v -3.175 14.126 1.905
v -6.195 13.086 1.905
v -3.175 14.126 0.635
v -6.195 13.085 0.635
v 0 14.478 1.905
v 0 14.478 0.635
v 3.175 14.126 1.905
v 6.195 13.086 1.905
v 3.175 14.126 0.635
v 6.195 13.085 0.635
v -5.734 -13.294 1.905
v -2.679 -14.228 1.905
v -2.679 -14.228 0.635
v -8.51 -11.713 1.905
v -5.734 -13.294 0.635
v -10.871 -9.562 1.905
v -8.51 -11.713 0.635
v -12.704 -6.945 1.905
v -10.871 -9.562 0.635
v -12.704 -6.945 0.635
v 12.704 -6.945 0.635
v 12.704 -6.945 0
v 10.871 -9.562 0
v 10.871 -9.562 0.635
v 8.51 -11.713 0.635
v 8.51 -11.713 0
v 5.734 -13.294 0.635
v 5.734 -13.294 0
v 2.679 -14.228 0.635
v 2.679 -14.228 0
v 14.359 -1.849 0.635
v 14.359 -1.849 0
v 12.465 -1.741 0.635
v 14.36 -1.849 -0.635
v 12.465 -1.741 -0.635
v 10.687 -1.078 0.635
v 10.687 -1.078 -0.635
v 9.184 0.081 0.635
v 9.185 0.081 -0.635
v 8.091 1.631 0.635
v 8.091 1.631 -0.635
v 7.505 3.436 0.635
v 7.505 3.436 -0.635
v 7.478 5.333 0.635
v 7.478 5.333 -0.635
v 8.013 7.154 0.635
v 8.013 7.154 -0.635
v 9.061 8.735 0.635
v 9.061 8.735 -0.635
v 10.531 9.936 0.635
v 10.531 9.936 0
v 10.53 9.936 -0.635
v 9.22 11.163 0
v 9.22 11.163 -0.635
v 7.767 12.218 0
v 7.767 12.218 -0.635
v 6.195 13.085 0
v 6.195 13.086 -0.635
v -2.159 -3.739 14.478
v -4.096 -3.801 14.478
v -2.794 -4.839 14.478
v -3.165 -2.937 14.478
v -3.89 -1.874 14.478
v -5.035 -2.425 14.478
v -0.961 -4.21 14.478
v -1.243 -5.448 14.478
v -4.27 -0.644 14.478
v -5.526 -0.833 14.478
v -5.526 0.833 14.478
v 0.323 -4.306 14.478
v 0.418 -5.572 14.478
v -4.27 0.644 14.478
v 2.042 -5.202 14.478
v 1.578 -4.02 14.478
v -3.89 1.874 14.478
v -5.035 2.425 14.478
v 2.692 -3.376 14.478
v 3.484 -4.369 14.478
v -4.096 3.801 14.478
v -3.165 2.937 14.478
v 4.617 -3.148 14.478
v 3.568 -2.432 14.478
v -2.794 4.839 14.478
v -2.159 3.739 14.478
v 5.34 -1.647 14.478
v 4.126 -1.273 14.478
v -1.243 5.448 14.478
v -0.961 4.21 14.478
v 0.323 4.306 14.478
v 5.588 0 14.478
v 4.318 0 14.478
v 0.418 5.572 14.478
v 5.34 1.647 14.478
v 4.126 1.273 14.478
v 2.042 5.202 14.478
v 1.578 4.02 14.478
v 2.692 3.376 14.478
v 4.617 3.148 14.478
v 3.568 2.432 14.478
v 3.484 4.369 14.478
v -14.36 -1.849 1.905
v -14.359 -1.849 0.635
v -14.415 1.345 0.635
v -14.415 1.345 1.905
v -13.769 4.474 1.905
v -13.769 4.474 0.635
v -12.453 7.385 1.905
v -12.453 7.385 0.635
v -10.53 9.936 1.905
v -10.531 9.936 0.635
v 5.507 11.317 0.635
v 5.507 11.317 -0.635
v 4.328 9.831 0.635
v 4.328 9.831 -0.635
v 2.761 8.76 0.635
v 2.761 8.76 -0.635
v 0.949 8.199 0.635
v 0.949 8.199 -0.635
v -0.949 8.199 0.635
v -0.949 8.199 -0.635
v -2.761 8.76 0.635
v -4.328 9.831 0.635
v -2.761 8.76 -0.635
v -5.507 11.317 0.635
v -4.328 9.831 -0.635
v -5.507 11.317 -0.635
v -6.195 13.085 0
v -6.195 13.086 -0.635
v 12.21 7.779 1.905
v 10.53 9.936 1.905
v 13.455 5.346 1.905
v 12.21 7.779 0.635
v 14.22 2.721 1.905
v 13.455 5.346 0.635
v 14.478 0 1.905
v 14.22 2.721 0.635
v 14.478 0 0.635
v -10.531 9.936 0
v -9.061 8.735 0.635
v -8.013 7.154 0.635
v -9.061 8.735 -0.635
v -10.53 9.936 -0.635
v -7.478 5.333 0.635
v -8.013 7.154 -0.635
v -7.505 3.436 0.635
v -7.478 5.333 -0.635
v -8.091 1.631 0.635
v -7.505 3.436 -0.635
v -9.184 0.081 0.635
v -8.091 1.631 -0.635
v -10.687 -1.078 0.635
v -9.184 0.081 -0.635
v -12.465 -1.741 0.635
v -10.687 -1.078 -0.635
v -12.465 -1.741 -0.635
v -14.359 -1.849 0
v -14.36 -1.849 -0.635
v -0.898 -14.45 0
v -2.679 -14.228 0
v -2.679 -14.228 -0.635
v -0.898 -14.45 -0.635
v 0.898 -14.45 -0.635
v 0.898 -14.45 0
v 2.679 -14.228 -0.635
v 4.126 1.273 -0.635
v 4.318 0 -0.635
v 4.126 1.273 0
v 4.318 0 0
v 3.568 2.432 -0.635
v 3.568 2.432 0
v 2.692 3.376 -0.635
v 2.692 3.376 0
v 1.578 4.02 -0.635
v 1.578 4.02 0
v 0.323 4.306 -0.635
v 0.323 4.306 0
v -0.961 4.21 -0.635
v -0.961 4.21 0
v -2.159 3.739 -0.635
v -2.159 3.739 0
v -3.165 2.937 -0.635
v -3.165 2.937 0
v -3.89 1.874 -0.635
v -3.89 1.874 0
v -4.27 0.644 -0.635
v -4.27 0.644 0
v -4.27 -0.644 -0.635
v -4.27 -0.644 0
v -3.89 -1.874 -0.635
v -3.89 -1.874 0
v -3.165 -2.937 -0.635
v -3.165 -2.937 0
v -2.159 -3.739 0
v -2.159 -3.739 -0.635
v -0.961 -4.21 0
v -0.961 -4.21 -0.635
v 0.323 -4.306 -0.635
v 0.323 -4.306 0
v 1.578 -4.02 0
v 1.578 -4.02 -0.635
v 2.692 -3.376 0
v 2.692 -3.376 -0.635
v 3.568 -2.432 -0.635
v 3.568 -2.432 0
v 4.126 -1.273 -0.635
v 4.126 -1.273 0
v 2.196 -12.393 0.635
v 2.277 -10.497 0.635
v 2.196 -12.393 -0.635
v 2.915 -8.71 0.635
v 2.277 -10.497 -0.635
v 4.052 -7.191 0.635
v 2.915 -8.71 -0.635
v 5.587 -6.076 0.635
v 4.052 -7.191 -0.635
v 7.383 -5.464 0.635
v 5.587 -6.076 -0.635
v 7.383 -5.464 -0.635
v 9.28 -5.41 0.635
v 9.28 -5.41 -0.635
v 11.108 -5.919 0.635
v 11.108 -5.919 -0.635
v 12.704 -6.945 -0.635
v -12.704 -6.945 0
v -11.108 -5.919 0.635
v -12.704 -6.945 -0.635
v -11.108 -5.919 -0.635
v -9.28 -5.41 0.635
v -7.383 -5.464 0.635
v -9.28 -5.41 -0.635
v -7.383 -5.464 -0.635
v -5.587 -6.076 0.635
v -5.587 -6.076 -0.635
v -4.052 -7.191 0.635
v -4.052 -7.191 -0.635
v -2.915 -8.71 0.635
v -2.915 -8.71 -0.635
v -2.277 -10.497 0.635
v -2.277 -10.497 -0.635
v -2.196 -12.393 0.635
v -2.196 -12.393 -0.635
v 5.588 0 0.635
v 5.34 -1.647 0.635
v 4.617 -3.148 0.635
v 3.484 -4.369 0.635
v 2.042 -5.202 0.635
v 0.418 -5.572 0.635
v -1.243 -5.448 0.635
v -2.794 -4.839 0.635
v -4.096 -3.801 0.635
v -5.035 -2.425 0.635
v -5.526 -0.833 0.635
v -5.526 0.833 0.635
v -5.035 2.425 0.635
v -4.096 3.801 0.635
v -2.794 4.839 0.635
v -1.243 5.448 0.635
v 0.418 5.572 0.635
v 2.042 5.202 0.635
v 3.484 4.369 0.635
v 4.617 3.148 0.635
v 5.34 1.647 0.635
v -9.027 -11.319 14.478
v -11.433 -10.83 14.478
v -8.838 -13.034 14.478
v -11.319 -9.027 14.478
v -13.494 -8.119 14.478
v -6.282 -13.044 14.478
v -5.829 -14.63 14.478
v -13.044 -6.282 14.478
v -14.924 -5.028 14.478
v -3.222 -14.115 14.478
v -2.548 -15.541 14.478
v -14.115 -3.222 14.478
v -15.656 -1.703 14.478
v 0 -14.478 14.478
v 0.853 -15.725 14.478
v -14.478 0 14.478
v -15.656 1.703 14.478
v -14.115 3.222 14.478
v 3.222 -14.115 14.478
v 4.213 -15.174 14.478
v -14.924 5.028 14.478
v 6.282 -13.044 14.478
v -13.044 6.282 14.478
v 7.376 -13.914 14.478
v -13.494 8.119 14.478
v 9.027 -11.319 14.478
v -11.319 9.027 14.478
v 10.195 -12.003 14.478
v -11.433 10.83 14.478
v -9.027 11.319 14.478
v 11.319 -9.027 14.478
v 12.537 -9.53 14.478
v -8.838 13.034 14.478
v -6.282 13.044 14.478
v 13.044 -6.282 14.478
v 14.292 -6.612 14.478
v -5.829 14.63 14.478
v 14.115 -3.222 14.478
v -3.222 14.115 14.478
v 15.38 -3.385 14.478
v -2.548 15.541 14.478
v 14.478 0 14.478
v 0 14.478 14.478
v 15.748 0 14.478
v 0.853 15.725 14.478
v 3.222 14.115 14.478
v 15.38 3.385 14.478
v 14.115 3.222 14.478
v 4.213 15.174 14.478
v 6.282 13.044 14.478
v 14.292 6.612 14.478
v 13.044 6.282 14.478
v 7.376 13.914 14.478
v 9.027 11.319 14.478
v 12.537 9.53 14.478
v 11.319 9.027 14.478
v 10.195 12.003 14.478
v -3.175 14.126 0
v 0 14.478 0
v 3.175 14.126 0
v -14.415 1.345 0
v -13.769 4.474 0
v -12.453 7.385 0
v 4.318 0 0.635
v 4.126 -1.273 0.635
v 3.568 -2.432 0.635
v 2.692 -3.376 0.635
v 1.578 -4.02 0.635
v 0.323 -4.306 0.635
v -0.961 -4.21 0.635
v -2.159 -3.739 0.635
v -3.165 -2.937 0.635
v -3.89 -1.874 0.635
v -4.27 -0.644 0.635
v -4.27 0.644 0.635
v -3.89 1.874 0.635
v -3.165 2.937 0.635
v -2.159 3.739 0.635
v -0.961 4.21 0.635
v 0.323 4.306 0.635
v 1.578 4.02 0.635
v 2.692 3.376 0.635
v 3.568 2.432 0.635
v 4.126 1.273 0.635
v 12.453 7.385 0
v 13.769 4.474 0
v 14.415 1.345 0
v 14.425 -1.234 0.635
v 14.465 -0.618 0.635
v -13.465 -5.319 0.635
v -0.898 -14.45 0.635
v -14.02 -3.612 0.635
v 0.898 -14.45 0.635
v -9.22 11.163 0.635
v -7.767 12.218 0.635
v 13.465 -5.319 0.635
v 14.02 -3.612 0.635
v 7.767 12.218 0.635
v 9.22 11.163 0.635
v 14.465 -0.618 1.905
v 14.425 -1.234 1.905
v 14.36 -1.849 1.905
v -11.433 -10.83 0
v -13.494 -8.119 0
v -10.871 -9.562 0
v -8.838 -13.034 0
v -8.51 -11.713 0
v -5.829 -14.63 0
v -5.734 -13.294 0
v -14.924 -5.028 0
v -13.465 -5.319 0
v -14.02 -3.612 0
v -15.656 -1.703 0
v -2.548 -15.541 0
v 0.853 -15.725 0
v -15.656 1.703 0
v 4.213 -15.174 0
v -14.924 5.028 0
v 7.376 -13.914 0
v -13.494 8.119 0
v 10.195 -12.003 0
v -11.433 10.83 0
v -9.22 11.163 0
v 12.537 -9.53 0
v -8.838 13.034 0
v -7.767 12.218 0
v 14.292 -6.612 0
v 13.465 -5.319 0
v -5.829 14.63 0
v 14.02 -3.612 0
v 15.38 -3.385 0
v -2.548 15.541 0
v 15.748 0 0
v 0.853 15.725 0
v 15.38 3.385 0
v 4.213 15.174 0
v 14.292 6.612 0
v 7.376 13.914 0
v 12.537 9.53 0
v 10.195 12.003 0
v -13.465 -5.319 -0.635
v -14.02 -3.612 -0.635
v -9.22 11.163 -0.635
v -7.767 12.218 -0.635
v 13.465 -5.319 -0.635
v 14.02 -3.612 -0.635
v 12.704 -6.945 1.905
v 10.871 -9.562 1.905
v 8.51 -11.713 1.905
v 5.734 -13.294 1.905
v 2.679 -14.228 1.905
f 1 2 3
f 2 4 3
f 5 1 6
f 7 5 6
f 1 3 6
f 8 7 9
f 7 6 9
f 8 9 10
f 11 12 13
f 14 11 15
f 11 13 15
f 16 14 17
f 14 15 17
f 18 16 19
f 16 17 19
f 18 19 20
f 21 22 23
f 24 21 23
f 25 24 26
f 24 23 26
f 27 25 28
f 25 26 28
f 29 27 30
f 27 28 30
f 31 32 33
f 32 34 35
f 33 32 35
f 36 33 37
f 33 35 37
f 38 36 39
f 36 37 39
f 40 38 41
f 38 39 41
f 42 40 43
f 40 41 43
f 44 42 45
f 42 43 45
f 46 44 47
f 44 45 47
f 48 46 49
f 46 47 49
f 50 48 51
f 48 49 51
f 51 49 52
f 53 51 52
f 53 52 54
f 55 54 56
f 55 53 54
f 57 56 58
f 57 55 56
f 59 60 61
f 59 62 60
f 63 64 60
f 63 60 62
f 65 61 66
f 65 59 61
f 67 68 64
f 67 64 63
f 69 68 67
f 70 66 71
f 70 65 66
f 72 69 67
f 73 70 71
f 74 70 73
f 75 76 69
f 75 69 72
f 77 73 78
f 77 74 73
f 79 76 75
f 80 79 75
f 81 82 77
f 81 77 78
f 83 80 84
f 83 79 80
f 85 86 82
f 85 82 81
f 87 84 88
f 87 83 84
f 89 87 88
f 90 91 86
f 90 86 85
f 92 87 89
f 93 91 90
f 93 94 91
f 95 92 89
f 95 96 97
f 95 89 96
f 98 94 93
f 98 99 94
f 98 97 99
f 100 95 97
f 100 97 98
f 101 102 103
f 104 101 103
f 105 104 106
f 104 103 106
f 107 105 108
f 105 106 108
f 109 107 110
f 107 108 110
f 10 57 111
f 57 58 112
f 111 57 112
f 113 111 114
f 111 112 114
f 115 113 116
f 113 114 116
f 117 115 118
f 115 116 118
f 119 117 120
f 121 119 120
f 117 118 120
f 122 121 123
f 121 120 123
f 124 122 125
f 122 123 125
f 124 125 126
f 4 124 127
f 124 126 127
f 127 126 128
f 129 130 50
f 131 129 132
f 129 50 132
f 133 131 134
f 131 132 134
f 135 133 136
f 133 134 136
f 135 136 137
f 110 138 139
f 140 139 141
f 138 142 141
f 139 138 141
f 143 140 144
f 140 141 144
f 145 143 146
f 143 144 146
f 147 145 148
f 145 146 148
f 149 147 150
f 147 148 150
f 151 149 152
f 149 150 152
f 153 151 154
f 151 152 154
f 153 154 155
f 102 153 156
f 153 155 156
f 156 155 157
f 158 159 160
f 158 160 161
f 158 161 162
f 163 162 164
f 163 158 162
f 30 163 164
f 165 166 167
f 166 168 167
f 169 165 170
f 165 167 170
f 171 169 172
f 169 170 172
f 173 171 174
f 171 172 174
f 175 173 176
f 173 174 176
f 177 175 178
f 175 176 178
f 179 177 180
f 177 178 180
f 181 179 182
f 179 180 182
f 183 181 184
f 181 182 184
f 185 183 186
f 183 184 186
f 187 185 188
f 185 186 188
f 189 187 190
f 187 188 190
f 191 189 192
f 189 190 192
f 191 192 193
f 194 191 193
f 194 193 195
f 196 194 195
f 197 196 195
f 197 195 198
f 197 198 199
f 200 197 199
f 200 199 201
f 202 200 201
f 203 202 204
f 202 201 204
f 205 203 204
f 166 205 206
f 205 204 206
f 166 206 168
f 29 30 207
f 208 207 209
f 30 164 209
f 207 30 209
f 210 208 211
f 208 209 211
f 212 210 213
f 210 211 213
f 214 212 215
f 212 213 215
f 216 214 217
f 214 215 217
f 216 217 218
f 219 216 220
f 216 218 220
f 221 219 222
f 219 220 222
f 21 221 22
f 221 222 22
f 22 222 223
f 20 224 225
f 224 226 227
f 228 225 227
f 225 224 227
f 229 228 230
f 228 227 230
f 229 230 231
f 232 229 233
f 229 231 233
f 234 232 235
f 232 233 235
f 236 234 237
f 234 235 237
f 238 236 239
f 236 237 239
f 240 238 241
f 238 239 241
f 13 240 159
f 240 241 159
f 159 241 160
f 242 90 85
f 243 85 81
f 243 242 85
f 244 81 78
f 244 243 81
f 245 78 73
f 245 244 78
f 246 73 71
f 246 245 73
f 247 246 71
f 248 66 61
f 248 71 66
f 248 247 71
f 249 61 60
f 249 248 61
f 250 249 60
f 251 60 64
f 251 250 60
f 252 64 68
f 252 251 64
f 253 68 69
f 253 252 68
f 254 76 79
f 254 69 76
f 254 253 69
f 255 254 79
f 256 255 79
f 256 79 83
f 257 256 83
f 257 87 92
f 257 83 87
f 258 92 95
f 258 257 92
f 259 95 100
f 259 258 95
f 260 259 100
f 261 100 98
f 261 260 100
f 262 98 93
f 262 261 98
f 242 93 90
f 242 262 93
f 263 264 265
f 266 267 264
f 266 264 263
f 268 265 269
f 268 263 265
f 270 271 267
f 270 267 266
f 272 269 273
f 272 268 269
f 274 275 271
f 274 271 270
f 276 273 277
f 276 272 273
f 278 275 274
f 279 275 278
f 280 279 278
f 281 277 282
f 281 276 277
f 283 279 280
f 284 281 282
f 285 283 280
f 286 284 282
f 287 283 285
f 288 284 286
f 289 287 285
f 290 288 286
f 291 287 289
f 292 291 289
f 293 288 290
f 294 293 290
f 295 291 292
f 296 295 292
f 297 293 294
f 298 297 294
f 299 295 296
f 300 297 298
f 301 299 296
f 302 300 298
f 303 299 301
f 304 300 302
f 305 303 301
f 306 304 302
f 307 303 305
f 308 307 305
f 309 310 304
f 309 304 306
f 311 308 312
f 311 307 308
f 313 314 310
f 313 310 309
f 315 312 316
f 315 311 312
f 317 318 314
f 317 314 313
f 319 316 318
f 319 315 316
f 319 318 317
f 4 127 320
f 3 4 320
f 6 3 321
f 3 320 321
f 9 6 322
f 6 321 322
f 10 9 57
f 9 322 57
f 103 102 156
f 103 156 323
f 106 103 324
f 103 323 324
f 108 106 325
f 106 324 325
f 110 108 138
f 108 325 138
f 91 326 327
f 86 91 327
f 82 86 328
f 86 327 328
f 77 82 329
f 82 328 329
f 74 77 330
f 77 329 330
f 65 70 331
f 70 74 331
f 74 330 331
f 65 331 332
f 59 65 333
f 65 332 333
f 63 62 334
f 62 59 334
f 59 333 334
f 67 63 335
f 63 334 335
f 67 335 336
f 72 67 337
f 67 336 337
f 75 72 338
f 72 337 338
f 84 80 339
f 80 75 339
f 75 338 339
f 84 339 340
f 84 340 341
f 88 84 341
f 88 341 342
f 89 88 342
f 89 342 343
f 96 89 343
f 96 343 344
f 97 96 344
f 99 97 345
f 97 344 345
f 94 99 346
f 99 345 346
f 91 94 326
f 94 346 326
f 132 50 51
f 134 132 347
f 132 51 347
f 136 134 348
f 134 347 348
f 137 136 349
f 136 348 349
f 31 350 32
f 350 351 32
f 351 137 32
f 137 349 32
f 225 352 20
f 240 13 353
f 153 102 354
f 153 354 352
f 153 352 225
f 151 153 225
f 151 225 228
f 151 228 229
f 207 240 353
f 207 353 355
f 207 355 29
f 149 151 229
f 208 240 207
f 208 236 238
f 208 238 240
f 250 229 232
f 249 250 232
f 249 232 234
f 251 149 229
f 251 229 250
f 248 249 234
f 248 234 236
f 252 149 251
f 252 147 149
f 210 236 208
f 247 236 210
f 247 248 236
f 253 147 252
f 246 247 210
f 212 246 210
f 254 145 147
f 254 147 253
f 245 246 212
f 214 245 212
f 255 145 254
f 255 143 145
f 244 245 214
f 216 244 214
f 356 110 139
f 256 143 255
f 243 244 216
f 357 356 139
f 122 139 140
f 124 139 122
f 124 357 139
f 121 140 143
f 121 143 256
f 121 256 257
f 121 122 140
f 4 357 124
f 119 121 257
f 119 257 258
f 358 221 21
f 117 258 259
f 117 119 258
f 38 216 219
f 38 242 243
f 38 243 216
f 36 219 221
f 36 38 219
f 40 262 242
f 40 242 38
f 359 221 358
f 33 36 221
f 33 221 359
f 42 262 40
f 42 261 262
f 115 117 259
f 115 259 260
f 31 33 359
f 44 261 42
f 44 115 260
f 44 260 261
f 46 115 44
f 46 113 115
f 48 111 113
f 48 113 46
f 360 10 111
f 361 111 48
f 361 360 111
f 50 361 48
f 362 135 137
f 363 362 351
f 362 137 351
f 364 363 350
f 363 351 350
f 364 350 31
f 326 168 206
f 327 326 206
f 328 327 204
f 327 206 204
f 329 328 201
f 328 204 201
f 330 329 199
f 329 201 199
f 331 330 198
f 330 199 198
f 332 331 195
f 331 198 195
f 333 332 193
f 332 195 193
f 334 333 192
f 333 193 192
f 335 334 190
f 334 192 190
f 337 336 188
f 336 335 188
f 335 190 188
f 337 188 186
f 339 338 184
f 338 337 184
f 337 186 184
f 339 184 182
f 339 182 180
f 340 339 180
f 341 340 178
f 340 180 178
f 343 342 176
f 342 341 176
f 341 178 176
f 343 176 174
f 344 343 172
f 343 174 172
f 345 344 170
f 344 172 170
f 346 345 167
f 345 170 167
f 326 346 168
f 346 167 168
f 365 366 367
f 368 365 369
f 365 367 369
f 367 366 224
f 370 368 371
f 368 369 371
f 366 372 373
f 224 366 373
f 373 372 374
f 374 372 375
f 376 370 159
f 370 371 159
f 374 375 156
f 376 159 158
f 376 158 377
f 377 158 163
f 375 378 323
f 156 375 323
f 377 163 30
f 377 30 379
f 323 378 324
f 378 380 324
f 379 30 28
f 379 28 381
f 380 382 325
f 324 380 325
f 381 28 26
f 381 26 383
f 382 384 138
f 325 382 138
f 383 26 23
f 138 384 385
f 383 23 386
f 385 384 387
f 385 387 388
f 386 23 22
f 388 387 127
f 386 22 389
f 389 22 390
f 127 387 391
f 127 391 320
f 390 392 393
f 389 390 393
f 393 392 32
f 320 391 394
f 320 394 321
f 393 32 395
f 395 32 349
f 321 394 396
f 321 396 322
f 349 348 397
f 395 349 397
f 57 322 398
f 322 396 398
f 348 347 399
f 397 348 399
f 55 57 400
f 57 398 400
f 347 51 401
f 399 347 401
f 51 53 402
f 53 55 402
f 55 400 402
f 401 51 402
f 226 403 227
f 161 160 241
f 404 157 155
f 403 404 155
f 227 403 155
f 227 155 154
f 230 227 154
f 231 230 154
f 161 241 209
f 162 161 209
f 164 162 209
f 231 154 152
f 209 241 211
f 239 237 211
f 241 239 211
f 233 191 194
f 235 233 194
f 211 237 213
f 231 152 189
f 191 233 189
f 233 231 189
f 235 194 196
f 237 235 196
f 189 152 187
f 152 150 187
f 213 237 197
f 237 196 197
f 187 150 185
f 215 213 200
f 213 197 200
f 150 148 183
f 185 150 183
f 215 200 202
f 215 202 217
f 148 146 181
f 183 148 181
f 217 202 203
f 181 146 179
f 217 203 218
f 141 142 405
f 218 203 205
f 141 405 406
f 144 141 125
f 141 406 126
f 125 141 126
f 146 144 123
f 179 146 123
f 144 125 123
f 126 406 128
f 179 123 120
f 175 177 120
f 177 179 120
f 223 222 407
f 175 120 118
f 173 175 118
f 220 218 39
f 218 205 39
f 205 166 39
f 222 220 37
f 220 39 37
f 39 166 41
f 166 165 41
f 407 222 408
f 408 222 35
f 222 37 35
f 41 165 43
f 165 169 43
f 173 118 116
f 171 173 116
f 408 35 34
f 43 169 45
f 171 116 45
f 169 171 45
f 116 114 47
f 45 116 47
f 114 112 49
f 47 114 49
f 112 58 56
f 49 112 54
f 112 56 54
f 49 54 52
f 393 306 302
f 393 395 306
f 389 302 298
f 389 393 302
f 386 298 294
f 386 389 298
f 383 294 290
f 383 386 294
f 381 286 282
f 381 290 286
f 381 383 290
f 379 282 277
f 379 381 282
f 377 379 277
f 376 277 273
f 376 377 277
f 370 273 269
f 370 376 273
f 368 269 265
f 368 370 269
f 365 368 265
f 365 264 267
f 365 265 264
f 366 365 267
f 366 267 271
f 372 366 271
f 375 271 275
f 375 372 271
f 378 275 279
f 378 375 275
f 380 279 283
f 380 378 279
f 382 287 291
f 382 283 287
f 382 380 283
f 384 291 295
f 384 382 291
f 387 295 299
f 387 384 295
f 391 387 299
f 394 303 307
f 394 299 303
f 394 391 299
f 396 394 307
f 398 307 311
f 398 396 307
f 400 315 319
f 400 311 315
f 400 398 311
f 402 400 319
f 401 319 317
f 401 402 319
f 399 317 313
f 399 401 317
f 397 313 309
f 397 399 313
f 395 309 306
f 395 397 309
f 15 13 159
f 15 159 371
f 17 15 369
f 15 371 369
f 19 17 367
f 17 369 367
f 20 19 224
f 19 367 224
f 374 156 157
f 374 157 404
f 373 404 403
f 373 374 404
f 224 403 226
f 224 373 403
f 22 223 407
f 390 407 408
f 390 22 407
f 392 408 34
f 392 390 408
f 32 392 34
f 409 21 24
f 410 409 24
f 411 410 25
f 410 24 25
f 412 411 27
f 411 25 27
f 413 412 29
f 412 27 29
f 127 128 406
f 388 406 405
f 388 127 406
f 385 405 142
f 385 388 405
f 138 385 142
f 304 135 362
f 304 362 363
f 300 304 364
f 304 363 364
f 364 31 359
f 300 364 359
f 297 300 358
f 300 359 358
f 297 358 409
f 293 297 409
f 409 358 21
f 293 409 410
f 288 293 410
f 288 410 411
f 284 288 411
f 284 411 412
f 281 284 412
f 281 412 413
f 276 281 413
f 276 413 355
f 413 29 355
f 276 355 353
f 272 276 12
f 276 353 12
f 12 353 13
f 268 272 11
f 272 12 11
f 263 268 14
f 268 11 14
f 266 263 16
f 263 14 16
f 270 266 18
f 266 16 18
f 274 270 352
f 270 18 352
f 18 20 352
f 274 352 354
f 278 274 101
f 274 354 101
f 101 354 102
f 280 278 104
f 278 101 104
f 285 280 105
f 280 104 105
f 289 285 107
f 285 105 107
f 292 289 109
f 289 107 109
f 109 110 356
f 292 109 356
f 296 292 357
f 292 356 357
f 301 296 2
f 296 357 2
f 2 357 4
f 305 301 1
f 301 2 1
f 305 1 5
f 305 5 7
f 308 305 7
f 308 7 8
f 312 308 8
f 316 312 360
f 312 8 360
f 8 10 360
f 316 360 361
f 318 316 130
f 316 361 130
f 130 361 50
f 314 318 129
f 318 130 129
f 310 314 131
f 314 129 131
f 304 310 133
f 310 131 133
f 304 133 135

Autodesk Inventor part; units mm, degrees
ref_plane "YZ Plane" through (0, 0, 0) normal (1, 0, 0) x (0, 1, 0)
ref_plane "XZ Plane" through (0, 0, 0) normal (0, 1, 0) x (-1, 0, 0)
ref_plane "XY Plane" through (0, 0, 0) normal (0, 0, 1) x (1, 0, 0)
sketch "Sketch1" plane through (0, 0, 0) normal (0, 0, 1) x (1, 0, 0)
  circle A0 centre (0, 0) radius 5.588
  circle A1 centre (0, 0) radius 4.318
  circle A2 centre (0, 0) radius 14.478
  circle A3 centre (0, 0) radius 15.748
  dimension "d0" = 1.27
  dimension "d1" = 11.176
  dimension "d2" = 1.27
  dimension "d3" = 8.89
extrude "Extrusion1" add sketch "Sketch1" along normal blind 14.478
sketch "Sketch3" plane through (0, 0, 14.478) normal (0, 0, 1) x (1, 0, 0)
  point P0 (0, 0)
extrude "Extrusion2" add sketch "Sketch1" along normal mid plane 1.27 contours A0 | A2
sketch "Sketch4" plane through (0, 0, -0.635) normal (0, 0, -1) x (-1, 0, 0)
  arc A0 (-6.1954, 13.0855) -> (6.1954, 13.0855) centre (0, 14.478) ccw
  arc A1 (6.1954, 13.0855) -> (-6.1954, 13.0855) centre (0, 0) ccw
  arc A2 (-14.3595, -1.8486) -> (-10.5305, 9.9358) centre (-13.7694, 4.4739) ccw
  arc A3 (-10.5305, 9.9358) -> (-14.3595, -1.8486) centre (0, 0) ccw
  arc A4 (-2.6792, -14.2279) -> (-12.7036, -6.9448) centre (-8.51, -11.7129) ccw
  arc A5 (-12.7036, -6.9448) -> (-2.6792, -14.2279) centre (0, 0) ccw
  arc A6 (12.7036, -6.9448) -> (2.6792, -14.2279) centre (8.51, -11.7129) ccw
  arc A7 (2.6792, -14.2279) -> (12.7036, -6.9448) centre (0, 0) ccw
  arc A8 (10.5305, 9.9358) -> (14.3595, -1.8486) centre (13.7694, 4.4739) ccw
  arc A9 (14.3595, -1.8486) -> (10.5305, 9.9358) centre (0, 0) ccw
  point P0 (0, 0)
  dimension "d8" = 12.7
  dimension "d11" = 360
extrude "Extrusion3" cut sketch "Sketch4" against normal blind 2.54
properties part number "WheelDE" material "PMMA Plastic"
